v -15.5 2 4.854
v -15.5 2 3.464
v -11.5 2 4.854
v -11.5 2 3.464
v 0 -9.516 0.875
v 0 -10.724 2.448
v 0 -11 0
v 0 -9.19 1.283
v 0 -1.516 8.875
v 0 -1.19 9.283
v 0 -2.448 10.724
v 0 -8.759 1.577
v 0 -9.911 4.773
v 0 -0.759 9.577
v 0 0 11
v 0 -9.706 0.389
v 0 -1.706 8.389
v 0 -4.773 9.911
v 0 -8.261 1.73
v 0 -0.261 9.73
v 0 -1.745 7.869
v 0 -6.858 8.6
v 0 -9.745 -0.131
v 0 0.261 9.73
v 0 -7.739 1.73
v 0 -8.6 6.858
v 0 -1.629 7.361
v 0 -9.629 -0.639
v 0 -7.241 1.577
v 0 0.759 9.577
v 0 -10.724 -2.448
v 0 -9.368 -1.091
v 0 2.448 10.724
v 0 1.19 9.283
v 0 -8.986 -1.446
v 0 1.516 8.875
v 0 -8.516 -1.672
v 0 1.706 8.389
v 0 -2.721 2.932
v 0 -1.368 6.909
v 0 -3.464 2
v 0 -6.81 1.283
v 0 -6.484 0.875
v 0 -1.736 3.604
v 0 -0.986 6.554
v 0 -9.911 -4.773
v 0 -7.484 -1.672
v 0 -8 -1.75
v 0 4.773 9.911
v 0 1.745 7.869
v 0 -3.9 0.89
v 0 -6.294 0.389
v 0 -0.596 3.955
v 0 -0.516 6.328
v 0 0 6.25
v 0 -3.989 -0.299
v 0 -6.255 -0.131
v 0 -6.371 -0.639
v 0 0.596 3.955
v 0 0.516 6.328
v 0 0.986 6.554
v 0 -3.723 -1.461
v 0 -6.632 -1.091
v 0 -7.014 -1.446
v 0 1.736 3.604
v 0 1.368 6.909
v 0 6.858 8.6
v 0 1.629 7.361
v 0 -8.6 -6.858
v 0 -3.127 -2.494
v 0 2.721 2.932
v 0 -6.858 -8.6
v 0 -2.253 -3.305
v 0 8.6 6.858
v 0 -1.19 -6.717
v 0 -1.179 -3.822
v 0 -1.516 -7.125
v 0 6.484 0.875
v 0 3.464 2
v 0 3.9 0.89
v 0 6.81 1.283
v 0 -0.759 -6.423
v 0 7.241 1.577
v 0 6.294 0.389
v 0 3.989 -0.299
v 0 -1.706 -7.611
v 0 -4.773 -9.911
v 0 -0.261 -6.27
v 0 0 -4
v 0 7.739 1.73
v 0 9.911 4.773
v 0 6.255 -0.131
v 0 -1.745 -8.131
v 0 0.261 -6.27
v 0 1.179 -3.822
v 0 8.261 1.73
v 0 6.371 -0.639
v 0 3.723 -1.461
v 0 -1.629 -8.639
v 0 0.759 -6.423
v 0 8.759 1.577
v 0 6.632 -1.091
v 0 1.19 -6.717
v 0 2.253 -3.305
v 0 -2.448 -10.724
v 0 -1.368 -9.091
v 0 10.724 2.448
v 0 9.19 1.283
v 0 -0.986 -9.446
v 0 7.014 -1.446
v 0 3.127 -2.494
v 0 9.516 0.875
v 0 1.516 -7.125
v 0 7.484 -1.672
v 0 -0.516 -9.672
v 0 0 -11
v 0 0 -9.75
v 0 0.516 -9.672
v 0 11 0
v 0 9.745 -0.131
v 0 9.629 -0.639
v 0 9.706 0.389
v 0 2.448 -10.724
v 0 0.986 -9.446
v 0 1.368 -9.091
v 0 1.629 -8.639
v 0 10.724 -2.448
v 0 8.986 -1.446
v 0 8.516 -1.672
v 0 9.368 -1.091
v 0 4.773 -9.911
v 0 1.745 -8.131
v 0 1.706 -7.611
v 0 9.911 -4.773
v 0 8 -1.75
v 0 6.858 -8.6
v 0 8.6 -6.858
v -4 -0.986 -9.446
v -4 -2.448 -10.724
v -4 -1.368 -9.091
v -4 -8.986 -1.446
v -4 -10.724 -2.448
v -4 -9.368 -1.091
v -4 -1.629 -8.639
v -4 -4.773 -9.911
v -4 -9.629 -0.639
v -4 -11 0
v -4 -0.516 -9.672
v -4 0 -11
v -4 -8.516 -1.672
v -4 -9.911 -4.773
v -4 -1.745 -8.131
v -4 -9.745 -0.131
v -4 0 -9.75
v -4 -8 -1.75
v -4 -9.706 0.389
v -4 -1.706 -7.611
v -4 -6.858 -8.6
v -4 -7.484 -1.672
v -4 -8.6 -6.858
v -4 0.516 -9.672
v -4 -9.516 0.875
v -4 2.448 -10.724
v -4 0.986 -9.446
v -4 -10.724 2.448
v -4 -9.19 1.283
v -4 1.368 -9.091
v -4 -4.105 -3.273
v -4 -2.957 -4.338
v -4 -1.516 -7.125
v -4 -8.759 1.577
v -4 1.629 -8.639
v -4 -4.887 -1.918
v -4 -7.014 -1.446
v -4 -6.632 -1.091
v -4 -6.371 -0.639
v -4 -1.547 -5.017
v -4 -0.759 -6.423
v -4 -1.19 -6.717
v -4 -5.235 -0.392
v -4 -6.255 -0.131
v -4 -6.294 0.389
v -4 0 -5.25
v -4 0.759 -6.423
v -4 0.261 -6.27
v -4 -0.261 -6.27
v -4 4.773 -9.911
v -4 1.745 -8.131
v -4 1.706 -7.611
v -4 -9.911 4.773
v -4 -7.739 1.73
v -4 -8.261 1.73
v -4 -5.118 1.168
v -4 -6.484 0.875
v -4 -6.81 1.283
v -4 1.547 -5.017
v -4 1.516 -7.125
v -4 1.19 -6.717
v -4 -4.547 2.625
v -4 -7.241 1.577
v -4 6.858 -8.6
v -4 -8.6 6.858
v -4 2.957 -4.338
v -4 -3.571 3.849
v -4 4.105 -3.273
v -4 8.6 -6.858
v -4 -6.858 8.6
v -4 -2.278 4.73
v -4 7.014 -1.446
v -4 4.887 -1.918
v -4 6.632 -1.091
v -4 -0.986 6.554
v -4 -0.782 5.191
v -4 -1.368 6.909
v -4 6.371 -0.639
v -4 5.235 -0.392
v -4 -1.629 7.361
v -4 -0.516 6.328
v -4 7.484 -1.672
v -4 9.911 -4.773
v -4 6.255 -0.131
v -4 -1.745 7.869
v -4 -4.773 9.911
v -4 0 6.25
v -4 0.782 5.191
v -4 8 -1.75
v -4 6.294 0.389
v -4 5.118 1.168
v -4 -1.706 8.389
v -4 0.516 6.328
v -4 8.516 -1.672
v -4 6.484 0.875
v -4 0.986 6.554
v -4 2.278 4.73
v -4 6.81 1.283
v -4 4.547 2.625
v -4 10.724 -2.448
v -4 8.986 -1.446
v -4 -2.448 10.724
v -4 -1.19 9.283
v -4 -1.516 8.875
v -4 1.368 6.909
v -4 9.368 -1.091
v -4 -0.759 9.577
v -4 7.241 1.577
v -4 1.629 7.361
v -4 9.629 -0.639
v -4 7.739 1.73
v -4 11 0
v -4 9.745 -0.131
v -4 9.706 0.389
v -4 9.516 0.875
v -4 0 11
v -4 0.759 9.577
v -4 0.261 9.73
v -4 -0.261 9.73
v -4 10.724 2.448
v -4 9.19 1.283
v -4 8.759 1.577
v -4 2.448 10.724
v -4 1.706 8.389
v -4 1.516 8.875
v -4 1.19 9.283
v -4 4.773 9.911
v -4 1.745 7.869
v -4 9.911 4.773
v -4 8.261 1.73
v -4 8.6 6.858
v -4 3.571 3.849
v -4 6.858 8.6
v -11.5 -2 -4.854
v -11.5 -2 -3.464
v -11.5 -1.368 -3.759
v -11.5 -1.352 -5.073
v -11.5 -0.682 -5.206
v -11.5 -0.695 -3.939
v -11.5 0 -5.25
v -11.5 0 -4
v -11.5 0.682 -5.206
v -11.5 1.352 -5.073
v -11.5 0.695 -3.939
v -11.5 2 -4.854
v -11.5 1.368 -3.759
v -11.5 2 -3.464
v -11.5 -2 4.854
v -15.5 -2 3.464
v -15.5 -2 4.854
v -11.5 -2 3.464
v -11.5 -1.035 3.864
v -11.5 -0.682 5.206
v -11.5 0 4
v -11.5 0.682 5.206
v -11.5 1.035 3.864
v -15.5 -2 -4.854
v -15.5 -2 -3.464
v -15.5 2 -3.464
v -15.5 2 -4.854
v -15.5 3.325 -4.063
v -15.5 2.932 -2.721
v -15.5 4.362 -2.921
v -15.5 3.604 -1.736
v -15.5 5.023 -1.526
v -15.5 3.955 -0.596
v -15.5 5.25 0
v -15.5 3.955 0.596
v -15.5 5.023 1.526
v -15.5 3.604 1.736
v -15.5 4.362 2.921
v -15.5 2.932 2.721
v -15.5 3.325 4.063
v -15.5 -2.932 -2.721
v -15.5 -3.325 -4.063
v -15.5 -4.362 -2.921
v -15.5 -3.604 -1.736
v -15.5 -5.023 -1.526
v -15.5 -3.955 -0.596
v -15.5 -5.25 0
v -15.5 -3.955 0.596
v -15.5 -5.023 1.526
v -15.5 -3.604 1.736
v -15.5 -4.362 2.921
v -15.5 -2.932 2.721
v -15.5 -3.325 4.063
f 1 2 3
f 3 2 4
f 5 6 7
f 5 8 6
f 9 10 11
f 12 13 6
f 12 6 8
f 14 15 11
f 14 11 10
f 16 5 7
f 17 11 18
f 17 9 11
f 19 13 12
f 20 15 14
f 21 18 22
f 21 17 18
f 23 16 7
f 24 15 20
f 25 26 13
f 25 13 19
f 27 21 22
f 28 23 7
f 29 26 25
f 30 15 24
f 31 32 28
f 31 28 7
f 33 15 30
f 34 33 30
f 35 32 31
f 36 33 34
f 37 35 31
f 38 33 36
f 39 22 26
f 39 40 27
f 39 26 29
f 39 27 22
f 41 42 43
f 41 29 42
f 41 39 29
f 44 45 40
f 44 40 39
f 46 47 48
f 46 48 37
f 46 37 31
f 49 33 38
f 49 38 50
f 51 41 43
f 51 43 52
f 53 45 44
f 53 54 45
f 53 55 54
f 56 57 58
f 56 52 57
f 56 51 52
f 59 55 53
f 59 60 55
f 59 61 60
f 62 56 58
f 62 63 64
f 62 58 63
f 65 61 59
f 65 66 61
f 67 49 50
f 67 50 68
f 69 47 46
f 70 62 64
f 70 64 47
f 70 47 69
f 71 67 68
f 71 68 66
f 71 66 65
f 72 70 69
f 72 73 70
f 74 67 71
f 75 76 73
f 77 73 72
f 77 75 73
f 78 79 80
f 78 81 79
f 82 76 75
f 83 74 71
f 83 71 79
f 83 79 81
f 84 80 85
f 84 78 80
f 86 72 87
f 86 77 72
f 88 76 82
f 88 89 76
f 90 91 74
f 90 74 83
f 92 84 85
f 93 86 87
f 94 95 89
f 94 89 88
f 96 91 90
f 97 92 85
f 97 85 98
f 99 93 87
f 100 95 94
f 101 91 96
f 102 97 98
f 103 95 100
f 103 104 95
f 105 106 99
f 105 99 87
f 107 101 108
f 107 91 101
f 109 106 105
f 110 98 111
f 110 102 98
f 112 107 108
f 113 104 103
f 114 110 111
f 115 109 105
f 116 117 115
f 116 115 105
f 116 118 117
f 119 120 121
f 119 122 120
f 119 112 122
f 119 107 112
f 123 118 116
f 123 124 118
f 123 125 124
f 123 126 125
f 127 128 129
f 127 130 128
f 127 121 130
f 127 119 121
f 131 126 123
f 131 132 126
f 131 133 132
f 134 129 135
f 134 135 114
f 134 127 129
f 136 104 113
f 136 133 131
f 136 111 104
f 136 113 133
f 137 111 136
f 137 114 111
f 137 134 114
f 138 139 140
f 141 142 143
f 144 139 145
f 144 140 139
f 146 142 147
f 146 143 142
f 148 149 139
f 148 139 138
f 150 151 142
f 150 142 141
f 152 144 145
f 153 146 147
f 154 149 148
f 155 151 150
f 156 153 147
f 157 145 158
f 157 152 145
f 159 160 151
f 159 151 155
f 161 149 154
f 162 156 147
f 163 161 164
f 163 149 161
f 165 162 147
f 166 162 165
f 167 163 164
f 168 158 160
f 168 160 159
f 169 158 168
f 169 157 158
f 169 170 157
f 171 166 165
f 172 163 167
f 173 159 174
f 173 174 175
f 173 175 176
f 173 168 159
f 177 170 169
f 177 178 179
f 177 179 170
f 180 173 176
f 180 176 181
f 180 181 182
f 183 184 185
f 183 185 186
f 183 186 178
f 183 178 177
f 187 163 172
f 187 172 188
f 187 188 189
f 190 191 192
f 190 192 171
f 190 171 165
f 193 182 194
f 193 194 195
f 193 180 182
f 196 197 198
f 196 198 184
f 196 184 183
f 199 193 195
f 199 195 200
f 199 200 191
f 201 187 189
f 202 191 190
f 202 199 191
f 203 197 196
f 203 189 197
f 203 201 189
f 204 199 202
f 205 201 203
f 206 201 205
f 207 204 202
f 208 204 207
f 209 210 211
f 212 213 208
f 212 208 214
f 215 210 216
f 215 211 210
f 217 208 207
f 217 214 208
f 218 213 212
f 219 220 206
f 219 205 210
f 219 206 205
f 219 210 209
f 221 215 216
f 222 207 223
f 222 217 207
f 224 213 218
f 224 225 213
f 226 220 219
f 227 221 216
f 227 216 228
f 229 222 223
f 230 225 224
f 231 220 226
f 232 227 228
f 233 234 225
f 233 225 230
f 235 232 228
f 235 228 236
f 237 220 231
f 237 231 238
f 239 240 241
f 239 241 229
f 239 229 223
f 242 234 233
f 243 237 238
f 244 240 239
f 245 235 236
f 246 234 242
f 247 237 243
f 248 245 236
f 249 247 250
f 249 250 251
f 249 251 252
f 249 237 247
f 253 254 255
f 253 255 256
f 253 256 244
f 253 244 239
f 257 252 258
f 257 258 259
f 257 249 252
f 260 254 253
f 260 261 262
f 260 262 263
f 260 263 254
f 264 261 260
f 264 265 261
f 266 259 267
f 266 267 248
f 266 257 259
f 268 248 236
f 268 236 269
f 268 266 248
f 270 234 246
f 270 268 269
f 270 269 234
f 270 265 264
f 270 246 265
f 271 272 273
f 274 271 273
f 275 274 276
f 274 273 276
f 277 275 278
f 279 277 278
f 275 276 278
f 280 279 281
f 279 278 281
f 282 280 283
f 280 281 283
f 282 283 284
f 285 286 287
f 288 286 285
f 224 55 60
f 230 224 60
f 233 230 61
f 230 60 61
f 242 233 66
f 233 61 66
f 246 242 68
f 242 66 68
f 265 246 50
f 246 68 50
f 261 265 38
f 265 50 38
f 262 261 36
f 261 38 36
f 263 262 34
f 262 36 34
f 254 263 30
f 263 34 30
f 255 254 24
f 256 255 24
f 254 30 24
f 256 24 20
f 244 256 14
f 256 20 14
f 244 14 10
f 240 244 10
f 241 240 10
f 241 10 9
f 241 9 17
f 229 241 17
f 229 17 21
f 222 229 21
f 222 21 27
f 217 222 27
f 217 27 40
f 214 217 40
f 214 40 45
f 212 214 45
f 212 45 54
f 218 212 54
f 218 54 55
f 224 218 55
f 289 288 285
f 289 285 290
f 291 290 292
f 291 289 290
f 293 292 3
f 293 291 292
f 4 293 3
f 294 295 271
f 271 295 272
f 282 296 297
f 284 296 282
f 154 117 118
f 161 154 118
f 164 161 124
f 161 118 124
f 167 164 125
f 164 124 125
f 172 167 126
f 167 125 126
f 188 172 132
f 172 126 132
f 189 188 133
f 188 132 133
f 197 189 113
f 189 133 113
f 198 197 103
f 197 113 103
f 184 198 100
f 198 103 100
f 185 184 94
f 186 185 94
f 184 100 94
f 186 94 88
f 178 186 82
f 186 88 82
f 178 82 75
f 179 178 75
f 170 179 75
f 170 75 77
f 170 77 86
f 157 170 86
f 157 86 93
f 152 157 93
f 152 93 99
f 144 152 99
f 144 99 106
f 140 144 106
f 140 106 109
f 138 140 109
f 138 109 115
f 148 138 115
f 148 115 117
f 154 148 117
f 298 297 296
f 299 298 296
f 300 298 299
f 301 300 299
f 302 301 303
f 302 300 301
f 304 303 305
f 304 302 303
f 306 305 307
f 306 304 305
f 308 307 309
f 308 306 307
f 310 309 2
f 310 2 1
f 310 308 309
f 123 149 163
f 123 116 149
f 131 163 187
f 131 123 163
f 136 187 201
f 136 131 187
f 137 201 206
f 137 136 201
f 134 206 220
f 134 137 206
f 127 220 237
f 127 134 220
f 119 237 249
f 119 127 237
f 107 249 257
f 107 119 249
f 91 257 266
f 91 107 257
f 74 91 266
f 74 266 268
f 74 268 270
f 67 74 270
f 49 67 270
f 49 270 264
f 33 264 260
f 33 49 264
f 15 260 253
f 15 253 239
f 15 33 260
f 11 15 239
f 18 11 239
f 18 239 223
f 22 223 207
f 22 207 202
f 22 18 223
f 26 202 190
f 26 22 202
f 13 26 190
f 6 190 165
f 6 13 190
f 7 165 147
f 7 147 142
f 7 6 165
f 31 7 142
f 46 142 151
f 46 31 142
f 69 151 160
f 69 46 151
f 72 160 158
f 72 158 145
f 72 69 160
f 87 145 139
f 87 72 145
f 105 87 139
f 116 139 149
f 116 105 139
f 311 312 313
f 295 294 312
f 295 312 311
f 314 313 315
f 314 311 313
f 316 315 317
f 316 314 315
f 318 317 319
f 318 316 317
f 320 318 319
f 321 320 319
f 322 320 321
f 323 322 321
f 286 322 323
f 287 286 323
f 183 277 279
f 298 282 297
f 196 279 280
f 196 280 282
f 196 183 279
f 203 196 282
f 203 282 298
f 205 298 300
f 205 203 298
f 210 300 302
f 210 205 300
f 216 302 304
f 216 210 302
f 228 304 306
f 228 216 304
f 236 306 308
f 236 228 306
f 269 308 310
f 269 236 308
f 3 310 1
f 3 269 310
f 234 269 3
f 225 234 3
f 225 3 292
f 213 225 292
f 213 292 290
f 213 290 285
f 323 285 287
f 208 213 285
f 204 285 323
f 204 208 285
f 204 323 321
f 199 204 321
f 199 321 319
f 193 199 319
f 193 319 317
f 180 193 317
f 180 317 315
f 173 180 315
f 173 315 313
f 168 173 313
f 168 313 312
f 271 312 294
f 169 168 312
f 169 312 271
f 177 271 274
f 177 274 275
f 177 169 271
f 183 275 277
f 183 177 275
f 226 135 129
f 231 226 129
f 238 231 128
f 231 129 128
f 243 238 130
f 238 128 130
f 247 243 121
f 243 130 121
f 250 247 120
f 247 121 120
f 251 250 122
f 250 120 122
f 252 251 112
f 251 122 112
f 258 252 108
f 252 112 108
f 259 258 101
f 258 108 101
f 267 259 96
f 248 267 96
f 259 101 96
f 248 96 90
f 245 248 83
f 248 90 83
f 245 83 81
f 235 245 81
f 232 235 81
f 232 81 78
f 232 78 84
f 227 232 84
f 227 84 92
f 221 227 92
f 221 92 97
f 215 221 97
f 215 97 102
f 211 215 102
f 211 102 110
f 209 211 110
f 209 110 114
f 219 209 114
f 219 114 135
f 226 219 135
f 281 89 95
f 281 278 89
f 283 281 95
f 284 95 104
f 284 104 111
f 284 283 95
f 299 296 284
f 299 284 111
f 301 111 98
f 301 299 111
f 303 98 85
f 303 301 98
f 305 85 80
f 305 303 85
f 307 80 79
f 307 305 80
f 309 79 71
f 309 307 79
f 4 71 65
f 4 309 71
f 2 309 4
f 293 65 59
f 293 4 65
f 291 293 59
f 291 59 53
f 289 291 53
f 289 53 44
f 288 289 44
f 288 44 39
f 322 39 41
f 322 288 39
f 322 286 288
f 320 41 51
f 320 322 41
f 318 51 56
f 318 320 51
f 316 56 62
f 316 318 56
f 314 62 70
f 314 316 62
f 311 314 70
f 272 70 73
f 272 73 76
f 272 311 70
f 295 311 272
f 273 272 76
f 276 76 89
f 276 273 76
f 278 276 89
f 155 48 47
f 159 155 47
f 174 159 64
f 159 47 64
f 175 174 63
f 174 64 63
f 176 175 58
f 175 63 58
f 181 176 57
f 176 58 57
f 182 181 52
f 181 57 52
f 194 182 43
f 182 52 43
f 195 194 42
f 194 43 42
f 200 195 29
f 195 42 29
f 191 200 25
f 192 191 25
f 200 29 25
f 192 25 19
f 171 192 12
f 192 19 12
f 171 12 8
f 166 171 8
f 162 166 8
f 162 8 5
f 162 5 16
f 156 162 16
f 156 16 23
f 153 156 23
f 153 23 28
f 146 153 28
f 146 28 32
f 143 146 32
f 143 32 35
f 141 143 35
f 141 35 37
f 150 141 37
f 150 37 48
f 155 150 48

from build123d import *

# Parameters (mm, degrees)
CUT_EXTRUDE1_REACH      = 17.5
SKETCH2_R               = 1.75
SKETCH3_W               = 4
SKETCH3_H               = 4
CUT_EXTRUDE2_DEPTH      = 12
CUT_EXTRUDE2_DEPTH_BACK = 12


with BuildPart() as part:
    # Sketch1 → Revolve1 (revolve)
    with BuildSketch(Plane(origin=(0, 0, 0), x_dir=(1, 0, 0), z_dir=(0, 1, 0))):
        Polygon((-15.5, 4), (-15.5, 5.25), (-4, 5.25), (-4, 11), (0, 11), (0, 4), align=None)
    revolve(axis=Axis((-43.707317073, 0, 0), (1, 0, 0)))

    # Sketch2 → Cut-Extrude1 (cut, up to next)
    with BuildSketch(Plane(origin=(0, 0, 0), x_dir=(0, 0, -1), z_dir=(1, 0, 0)), mode=Mode.PRIVATE) as cut_extrude1_sk1:
        with Locations((0, 8)):
            Circle(SKETCH2_R)
    cut_extrude1_tool1 = extrude(cut_extrude1_sk1.sketch, amount=-CUT_EXTRUDE1_REACH, mode=Mode.PRIVATE) & part.part
    add(cut_extrude1_tool1.solids().sort_by_distance((0, 8, 0))[0], mode=Mode.SUBTRACT)
    # Sketch2 → Cut-Extrude1 (cut, up to next)
    with BuildSketch(Plane(origin=(0, 0, 0), x_dir=(0, 0, -1), z_dir=(1, 0, 0)), mode=Mode.PRIVATE) as cut_extrude1_sk2:
        with Locations((8, 0)):
            Circle(SKETCH2_R)
    cut_extrude1_tool2 = extrude(cut_extrude1_sk2.sketch, amount=-CUT_EXTRUDE1_REACH, mode=Mode.PRIVATE) & part.part
    add(cut_extrude1_tool2.solids().sort_by_distance((0, 0, -8))[0], mode=Mode.SUBTRACT)
    # Sketch2 → Cut-Extrude1 (cut, up to next)
    with BuildSketch(Plane(origin=(0, 0, 0), x_dir=(0, 0, -1), z_dir=(1, 0, 0)), mode=Mode.PRIVATE) as cut_extrude1_sk3:
        with Locations((0, -8)):
            Circle(SKETCH2_R)
    cut_extrude1_tool3 = extrude(cut_extrude1_sk3.sketch, amount=-CUT_EXTRUDE1_REACH, mode=Mode.PRIVATE) & part.part
    add(cut_extrude1_tool3.solids().sort_by_distance((0, -8, 0))[0], mode=Mode.SUBTRACT)
    # Sketch2 → Cut-Extrude1 (cut, up to next)
    with BuildSketch(Plane(origin=(0, 0, 0), x_dir=(0, 0, -1), z_dir=(1, 0, 0)), mode=Mode.PRIVATE) as cut_extrude1_sk4:
        with Locations((-8, 0)):
            Circle(SKETCH2_R)
    cut_extrude1_tool4 = extrude(cut_extrude1_sk4.sketch, amount=-CUT_EXTRUDE1_REACH, mode=Mode.PRIVATE) & part.part
    add(cut_extrude1_tool4.solids().sort_by_distance((0, 0, 8))[0], mode=Mode.SUBTRACT)

    # Sketch3 → Cut-Extrude2 (cut, two sides)
    with BuildSketch(Plane.XY) as cut_extrude2_sk:
        with Locations((-13.5, 0)):
            Rectangle(SKETCH3_W, SKETCH3_H)
    extrude(amount=CUT_EXTRUDE2_DEPTH, mode=Mode.SUBTRACT)
    extrude(cut_extrude2_sk.sketch, amount=-CUT_EXTRUDE2_DEPTH_BACK, mode=Mode.SUBTRACT)


solid = part.part
